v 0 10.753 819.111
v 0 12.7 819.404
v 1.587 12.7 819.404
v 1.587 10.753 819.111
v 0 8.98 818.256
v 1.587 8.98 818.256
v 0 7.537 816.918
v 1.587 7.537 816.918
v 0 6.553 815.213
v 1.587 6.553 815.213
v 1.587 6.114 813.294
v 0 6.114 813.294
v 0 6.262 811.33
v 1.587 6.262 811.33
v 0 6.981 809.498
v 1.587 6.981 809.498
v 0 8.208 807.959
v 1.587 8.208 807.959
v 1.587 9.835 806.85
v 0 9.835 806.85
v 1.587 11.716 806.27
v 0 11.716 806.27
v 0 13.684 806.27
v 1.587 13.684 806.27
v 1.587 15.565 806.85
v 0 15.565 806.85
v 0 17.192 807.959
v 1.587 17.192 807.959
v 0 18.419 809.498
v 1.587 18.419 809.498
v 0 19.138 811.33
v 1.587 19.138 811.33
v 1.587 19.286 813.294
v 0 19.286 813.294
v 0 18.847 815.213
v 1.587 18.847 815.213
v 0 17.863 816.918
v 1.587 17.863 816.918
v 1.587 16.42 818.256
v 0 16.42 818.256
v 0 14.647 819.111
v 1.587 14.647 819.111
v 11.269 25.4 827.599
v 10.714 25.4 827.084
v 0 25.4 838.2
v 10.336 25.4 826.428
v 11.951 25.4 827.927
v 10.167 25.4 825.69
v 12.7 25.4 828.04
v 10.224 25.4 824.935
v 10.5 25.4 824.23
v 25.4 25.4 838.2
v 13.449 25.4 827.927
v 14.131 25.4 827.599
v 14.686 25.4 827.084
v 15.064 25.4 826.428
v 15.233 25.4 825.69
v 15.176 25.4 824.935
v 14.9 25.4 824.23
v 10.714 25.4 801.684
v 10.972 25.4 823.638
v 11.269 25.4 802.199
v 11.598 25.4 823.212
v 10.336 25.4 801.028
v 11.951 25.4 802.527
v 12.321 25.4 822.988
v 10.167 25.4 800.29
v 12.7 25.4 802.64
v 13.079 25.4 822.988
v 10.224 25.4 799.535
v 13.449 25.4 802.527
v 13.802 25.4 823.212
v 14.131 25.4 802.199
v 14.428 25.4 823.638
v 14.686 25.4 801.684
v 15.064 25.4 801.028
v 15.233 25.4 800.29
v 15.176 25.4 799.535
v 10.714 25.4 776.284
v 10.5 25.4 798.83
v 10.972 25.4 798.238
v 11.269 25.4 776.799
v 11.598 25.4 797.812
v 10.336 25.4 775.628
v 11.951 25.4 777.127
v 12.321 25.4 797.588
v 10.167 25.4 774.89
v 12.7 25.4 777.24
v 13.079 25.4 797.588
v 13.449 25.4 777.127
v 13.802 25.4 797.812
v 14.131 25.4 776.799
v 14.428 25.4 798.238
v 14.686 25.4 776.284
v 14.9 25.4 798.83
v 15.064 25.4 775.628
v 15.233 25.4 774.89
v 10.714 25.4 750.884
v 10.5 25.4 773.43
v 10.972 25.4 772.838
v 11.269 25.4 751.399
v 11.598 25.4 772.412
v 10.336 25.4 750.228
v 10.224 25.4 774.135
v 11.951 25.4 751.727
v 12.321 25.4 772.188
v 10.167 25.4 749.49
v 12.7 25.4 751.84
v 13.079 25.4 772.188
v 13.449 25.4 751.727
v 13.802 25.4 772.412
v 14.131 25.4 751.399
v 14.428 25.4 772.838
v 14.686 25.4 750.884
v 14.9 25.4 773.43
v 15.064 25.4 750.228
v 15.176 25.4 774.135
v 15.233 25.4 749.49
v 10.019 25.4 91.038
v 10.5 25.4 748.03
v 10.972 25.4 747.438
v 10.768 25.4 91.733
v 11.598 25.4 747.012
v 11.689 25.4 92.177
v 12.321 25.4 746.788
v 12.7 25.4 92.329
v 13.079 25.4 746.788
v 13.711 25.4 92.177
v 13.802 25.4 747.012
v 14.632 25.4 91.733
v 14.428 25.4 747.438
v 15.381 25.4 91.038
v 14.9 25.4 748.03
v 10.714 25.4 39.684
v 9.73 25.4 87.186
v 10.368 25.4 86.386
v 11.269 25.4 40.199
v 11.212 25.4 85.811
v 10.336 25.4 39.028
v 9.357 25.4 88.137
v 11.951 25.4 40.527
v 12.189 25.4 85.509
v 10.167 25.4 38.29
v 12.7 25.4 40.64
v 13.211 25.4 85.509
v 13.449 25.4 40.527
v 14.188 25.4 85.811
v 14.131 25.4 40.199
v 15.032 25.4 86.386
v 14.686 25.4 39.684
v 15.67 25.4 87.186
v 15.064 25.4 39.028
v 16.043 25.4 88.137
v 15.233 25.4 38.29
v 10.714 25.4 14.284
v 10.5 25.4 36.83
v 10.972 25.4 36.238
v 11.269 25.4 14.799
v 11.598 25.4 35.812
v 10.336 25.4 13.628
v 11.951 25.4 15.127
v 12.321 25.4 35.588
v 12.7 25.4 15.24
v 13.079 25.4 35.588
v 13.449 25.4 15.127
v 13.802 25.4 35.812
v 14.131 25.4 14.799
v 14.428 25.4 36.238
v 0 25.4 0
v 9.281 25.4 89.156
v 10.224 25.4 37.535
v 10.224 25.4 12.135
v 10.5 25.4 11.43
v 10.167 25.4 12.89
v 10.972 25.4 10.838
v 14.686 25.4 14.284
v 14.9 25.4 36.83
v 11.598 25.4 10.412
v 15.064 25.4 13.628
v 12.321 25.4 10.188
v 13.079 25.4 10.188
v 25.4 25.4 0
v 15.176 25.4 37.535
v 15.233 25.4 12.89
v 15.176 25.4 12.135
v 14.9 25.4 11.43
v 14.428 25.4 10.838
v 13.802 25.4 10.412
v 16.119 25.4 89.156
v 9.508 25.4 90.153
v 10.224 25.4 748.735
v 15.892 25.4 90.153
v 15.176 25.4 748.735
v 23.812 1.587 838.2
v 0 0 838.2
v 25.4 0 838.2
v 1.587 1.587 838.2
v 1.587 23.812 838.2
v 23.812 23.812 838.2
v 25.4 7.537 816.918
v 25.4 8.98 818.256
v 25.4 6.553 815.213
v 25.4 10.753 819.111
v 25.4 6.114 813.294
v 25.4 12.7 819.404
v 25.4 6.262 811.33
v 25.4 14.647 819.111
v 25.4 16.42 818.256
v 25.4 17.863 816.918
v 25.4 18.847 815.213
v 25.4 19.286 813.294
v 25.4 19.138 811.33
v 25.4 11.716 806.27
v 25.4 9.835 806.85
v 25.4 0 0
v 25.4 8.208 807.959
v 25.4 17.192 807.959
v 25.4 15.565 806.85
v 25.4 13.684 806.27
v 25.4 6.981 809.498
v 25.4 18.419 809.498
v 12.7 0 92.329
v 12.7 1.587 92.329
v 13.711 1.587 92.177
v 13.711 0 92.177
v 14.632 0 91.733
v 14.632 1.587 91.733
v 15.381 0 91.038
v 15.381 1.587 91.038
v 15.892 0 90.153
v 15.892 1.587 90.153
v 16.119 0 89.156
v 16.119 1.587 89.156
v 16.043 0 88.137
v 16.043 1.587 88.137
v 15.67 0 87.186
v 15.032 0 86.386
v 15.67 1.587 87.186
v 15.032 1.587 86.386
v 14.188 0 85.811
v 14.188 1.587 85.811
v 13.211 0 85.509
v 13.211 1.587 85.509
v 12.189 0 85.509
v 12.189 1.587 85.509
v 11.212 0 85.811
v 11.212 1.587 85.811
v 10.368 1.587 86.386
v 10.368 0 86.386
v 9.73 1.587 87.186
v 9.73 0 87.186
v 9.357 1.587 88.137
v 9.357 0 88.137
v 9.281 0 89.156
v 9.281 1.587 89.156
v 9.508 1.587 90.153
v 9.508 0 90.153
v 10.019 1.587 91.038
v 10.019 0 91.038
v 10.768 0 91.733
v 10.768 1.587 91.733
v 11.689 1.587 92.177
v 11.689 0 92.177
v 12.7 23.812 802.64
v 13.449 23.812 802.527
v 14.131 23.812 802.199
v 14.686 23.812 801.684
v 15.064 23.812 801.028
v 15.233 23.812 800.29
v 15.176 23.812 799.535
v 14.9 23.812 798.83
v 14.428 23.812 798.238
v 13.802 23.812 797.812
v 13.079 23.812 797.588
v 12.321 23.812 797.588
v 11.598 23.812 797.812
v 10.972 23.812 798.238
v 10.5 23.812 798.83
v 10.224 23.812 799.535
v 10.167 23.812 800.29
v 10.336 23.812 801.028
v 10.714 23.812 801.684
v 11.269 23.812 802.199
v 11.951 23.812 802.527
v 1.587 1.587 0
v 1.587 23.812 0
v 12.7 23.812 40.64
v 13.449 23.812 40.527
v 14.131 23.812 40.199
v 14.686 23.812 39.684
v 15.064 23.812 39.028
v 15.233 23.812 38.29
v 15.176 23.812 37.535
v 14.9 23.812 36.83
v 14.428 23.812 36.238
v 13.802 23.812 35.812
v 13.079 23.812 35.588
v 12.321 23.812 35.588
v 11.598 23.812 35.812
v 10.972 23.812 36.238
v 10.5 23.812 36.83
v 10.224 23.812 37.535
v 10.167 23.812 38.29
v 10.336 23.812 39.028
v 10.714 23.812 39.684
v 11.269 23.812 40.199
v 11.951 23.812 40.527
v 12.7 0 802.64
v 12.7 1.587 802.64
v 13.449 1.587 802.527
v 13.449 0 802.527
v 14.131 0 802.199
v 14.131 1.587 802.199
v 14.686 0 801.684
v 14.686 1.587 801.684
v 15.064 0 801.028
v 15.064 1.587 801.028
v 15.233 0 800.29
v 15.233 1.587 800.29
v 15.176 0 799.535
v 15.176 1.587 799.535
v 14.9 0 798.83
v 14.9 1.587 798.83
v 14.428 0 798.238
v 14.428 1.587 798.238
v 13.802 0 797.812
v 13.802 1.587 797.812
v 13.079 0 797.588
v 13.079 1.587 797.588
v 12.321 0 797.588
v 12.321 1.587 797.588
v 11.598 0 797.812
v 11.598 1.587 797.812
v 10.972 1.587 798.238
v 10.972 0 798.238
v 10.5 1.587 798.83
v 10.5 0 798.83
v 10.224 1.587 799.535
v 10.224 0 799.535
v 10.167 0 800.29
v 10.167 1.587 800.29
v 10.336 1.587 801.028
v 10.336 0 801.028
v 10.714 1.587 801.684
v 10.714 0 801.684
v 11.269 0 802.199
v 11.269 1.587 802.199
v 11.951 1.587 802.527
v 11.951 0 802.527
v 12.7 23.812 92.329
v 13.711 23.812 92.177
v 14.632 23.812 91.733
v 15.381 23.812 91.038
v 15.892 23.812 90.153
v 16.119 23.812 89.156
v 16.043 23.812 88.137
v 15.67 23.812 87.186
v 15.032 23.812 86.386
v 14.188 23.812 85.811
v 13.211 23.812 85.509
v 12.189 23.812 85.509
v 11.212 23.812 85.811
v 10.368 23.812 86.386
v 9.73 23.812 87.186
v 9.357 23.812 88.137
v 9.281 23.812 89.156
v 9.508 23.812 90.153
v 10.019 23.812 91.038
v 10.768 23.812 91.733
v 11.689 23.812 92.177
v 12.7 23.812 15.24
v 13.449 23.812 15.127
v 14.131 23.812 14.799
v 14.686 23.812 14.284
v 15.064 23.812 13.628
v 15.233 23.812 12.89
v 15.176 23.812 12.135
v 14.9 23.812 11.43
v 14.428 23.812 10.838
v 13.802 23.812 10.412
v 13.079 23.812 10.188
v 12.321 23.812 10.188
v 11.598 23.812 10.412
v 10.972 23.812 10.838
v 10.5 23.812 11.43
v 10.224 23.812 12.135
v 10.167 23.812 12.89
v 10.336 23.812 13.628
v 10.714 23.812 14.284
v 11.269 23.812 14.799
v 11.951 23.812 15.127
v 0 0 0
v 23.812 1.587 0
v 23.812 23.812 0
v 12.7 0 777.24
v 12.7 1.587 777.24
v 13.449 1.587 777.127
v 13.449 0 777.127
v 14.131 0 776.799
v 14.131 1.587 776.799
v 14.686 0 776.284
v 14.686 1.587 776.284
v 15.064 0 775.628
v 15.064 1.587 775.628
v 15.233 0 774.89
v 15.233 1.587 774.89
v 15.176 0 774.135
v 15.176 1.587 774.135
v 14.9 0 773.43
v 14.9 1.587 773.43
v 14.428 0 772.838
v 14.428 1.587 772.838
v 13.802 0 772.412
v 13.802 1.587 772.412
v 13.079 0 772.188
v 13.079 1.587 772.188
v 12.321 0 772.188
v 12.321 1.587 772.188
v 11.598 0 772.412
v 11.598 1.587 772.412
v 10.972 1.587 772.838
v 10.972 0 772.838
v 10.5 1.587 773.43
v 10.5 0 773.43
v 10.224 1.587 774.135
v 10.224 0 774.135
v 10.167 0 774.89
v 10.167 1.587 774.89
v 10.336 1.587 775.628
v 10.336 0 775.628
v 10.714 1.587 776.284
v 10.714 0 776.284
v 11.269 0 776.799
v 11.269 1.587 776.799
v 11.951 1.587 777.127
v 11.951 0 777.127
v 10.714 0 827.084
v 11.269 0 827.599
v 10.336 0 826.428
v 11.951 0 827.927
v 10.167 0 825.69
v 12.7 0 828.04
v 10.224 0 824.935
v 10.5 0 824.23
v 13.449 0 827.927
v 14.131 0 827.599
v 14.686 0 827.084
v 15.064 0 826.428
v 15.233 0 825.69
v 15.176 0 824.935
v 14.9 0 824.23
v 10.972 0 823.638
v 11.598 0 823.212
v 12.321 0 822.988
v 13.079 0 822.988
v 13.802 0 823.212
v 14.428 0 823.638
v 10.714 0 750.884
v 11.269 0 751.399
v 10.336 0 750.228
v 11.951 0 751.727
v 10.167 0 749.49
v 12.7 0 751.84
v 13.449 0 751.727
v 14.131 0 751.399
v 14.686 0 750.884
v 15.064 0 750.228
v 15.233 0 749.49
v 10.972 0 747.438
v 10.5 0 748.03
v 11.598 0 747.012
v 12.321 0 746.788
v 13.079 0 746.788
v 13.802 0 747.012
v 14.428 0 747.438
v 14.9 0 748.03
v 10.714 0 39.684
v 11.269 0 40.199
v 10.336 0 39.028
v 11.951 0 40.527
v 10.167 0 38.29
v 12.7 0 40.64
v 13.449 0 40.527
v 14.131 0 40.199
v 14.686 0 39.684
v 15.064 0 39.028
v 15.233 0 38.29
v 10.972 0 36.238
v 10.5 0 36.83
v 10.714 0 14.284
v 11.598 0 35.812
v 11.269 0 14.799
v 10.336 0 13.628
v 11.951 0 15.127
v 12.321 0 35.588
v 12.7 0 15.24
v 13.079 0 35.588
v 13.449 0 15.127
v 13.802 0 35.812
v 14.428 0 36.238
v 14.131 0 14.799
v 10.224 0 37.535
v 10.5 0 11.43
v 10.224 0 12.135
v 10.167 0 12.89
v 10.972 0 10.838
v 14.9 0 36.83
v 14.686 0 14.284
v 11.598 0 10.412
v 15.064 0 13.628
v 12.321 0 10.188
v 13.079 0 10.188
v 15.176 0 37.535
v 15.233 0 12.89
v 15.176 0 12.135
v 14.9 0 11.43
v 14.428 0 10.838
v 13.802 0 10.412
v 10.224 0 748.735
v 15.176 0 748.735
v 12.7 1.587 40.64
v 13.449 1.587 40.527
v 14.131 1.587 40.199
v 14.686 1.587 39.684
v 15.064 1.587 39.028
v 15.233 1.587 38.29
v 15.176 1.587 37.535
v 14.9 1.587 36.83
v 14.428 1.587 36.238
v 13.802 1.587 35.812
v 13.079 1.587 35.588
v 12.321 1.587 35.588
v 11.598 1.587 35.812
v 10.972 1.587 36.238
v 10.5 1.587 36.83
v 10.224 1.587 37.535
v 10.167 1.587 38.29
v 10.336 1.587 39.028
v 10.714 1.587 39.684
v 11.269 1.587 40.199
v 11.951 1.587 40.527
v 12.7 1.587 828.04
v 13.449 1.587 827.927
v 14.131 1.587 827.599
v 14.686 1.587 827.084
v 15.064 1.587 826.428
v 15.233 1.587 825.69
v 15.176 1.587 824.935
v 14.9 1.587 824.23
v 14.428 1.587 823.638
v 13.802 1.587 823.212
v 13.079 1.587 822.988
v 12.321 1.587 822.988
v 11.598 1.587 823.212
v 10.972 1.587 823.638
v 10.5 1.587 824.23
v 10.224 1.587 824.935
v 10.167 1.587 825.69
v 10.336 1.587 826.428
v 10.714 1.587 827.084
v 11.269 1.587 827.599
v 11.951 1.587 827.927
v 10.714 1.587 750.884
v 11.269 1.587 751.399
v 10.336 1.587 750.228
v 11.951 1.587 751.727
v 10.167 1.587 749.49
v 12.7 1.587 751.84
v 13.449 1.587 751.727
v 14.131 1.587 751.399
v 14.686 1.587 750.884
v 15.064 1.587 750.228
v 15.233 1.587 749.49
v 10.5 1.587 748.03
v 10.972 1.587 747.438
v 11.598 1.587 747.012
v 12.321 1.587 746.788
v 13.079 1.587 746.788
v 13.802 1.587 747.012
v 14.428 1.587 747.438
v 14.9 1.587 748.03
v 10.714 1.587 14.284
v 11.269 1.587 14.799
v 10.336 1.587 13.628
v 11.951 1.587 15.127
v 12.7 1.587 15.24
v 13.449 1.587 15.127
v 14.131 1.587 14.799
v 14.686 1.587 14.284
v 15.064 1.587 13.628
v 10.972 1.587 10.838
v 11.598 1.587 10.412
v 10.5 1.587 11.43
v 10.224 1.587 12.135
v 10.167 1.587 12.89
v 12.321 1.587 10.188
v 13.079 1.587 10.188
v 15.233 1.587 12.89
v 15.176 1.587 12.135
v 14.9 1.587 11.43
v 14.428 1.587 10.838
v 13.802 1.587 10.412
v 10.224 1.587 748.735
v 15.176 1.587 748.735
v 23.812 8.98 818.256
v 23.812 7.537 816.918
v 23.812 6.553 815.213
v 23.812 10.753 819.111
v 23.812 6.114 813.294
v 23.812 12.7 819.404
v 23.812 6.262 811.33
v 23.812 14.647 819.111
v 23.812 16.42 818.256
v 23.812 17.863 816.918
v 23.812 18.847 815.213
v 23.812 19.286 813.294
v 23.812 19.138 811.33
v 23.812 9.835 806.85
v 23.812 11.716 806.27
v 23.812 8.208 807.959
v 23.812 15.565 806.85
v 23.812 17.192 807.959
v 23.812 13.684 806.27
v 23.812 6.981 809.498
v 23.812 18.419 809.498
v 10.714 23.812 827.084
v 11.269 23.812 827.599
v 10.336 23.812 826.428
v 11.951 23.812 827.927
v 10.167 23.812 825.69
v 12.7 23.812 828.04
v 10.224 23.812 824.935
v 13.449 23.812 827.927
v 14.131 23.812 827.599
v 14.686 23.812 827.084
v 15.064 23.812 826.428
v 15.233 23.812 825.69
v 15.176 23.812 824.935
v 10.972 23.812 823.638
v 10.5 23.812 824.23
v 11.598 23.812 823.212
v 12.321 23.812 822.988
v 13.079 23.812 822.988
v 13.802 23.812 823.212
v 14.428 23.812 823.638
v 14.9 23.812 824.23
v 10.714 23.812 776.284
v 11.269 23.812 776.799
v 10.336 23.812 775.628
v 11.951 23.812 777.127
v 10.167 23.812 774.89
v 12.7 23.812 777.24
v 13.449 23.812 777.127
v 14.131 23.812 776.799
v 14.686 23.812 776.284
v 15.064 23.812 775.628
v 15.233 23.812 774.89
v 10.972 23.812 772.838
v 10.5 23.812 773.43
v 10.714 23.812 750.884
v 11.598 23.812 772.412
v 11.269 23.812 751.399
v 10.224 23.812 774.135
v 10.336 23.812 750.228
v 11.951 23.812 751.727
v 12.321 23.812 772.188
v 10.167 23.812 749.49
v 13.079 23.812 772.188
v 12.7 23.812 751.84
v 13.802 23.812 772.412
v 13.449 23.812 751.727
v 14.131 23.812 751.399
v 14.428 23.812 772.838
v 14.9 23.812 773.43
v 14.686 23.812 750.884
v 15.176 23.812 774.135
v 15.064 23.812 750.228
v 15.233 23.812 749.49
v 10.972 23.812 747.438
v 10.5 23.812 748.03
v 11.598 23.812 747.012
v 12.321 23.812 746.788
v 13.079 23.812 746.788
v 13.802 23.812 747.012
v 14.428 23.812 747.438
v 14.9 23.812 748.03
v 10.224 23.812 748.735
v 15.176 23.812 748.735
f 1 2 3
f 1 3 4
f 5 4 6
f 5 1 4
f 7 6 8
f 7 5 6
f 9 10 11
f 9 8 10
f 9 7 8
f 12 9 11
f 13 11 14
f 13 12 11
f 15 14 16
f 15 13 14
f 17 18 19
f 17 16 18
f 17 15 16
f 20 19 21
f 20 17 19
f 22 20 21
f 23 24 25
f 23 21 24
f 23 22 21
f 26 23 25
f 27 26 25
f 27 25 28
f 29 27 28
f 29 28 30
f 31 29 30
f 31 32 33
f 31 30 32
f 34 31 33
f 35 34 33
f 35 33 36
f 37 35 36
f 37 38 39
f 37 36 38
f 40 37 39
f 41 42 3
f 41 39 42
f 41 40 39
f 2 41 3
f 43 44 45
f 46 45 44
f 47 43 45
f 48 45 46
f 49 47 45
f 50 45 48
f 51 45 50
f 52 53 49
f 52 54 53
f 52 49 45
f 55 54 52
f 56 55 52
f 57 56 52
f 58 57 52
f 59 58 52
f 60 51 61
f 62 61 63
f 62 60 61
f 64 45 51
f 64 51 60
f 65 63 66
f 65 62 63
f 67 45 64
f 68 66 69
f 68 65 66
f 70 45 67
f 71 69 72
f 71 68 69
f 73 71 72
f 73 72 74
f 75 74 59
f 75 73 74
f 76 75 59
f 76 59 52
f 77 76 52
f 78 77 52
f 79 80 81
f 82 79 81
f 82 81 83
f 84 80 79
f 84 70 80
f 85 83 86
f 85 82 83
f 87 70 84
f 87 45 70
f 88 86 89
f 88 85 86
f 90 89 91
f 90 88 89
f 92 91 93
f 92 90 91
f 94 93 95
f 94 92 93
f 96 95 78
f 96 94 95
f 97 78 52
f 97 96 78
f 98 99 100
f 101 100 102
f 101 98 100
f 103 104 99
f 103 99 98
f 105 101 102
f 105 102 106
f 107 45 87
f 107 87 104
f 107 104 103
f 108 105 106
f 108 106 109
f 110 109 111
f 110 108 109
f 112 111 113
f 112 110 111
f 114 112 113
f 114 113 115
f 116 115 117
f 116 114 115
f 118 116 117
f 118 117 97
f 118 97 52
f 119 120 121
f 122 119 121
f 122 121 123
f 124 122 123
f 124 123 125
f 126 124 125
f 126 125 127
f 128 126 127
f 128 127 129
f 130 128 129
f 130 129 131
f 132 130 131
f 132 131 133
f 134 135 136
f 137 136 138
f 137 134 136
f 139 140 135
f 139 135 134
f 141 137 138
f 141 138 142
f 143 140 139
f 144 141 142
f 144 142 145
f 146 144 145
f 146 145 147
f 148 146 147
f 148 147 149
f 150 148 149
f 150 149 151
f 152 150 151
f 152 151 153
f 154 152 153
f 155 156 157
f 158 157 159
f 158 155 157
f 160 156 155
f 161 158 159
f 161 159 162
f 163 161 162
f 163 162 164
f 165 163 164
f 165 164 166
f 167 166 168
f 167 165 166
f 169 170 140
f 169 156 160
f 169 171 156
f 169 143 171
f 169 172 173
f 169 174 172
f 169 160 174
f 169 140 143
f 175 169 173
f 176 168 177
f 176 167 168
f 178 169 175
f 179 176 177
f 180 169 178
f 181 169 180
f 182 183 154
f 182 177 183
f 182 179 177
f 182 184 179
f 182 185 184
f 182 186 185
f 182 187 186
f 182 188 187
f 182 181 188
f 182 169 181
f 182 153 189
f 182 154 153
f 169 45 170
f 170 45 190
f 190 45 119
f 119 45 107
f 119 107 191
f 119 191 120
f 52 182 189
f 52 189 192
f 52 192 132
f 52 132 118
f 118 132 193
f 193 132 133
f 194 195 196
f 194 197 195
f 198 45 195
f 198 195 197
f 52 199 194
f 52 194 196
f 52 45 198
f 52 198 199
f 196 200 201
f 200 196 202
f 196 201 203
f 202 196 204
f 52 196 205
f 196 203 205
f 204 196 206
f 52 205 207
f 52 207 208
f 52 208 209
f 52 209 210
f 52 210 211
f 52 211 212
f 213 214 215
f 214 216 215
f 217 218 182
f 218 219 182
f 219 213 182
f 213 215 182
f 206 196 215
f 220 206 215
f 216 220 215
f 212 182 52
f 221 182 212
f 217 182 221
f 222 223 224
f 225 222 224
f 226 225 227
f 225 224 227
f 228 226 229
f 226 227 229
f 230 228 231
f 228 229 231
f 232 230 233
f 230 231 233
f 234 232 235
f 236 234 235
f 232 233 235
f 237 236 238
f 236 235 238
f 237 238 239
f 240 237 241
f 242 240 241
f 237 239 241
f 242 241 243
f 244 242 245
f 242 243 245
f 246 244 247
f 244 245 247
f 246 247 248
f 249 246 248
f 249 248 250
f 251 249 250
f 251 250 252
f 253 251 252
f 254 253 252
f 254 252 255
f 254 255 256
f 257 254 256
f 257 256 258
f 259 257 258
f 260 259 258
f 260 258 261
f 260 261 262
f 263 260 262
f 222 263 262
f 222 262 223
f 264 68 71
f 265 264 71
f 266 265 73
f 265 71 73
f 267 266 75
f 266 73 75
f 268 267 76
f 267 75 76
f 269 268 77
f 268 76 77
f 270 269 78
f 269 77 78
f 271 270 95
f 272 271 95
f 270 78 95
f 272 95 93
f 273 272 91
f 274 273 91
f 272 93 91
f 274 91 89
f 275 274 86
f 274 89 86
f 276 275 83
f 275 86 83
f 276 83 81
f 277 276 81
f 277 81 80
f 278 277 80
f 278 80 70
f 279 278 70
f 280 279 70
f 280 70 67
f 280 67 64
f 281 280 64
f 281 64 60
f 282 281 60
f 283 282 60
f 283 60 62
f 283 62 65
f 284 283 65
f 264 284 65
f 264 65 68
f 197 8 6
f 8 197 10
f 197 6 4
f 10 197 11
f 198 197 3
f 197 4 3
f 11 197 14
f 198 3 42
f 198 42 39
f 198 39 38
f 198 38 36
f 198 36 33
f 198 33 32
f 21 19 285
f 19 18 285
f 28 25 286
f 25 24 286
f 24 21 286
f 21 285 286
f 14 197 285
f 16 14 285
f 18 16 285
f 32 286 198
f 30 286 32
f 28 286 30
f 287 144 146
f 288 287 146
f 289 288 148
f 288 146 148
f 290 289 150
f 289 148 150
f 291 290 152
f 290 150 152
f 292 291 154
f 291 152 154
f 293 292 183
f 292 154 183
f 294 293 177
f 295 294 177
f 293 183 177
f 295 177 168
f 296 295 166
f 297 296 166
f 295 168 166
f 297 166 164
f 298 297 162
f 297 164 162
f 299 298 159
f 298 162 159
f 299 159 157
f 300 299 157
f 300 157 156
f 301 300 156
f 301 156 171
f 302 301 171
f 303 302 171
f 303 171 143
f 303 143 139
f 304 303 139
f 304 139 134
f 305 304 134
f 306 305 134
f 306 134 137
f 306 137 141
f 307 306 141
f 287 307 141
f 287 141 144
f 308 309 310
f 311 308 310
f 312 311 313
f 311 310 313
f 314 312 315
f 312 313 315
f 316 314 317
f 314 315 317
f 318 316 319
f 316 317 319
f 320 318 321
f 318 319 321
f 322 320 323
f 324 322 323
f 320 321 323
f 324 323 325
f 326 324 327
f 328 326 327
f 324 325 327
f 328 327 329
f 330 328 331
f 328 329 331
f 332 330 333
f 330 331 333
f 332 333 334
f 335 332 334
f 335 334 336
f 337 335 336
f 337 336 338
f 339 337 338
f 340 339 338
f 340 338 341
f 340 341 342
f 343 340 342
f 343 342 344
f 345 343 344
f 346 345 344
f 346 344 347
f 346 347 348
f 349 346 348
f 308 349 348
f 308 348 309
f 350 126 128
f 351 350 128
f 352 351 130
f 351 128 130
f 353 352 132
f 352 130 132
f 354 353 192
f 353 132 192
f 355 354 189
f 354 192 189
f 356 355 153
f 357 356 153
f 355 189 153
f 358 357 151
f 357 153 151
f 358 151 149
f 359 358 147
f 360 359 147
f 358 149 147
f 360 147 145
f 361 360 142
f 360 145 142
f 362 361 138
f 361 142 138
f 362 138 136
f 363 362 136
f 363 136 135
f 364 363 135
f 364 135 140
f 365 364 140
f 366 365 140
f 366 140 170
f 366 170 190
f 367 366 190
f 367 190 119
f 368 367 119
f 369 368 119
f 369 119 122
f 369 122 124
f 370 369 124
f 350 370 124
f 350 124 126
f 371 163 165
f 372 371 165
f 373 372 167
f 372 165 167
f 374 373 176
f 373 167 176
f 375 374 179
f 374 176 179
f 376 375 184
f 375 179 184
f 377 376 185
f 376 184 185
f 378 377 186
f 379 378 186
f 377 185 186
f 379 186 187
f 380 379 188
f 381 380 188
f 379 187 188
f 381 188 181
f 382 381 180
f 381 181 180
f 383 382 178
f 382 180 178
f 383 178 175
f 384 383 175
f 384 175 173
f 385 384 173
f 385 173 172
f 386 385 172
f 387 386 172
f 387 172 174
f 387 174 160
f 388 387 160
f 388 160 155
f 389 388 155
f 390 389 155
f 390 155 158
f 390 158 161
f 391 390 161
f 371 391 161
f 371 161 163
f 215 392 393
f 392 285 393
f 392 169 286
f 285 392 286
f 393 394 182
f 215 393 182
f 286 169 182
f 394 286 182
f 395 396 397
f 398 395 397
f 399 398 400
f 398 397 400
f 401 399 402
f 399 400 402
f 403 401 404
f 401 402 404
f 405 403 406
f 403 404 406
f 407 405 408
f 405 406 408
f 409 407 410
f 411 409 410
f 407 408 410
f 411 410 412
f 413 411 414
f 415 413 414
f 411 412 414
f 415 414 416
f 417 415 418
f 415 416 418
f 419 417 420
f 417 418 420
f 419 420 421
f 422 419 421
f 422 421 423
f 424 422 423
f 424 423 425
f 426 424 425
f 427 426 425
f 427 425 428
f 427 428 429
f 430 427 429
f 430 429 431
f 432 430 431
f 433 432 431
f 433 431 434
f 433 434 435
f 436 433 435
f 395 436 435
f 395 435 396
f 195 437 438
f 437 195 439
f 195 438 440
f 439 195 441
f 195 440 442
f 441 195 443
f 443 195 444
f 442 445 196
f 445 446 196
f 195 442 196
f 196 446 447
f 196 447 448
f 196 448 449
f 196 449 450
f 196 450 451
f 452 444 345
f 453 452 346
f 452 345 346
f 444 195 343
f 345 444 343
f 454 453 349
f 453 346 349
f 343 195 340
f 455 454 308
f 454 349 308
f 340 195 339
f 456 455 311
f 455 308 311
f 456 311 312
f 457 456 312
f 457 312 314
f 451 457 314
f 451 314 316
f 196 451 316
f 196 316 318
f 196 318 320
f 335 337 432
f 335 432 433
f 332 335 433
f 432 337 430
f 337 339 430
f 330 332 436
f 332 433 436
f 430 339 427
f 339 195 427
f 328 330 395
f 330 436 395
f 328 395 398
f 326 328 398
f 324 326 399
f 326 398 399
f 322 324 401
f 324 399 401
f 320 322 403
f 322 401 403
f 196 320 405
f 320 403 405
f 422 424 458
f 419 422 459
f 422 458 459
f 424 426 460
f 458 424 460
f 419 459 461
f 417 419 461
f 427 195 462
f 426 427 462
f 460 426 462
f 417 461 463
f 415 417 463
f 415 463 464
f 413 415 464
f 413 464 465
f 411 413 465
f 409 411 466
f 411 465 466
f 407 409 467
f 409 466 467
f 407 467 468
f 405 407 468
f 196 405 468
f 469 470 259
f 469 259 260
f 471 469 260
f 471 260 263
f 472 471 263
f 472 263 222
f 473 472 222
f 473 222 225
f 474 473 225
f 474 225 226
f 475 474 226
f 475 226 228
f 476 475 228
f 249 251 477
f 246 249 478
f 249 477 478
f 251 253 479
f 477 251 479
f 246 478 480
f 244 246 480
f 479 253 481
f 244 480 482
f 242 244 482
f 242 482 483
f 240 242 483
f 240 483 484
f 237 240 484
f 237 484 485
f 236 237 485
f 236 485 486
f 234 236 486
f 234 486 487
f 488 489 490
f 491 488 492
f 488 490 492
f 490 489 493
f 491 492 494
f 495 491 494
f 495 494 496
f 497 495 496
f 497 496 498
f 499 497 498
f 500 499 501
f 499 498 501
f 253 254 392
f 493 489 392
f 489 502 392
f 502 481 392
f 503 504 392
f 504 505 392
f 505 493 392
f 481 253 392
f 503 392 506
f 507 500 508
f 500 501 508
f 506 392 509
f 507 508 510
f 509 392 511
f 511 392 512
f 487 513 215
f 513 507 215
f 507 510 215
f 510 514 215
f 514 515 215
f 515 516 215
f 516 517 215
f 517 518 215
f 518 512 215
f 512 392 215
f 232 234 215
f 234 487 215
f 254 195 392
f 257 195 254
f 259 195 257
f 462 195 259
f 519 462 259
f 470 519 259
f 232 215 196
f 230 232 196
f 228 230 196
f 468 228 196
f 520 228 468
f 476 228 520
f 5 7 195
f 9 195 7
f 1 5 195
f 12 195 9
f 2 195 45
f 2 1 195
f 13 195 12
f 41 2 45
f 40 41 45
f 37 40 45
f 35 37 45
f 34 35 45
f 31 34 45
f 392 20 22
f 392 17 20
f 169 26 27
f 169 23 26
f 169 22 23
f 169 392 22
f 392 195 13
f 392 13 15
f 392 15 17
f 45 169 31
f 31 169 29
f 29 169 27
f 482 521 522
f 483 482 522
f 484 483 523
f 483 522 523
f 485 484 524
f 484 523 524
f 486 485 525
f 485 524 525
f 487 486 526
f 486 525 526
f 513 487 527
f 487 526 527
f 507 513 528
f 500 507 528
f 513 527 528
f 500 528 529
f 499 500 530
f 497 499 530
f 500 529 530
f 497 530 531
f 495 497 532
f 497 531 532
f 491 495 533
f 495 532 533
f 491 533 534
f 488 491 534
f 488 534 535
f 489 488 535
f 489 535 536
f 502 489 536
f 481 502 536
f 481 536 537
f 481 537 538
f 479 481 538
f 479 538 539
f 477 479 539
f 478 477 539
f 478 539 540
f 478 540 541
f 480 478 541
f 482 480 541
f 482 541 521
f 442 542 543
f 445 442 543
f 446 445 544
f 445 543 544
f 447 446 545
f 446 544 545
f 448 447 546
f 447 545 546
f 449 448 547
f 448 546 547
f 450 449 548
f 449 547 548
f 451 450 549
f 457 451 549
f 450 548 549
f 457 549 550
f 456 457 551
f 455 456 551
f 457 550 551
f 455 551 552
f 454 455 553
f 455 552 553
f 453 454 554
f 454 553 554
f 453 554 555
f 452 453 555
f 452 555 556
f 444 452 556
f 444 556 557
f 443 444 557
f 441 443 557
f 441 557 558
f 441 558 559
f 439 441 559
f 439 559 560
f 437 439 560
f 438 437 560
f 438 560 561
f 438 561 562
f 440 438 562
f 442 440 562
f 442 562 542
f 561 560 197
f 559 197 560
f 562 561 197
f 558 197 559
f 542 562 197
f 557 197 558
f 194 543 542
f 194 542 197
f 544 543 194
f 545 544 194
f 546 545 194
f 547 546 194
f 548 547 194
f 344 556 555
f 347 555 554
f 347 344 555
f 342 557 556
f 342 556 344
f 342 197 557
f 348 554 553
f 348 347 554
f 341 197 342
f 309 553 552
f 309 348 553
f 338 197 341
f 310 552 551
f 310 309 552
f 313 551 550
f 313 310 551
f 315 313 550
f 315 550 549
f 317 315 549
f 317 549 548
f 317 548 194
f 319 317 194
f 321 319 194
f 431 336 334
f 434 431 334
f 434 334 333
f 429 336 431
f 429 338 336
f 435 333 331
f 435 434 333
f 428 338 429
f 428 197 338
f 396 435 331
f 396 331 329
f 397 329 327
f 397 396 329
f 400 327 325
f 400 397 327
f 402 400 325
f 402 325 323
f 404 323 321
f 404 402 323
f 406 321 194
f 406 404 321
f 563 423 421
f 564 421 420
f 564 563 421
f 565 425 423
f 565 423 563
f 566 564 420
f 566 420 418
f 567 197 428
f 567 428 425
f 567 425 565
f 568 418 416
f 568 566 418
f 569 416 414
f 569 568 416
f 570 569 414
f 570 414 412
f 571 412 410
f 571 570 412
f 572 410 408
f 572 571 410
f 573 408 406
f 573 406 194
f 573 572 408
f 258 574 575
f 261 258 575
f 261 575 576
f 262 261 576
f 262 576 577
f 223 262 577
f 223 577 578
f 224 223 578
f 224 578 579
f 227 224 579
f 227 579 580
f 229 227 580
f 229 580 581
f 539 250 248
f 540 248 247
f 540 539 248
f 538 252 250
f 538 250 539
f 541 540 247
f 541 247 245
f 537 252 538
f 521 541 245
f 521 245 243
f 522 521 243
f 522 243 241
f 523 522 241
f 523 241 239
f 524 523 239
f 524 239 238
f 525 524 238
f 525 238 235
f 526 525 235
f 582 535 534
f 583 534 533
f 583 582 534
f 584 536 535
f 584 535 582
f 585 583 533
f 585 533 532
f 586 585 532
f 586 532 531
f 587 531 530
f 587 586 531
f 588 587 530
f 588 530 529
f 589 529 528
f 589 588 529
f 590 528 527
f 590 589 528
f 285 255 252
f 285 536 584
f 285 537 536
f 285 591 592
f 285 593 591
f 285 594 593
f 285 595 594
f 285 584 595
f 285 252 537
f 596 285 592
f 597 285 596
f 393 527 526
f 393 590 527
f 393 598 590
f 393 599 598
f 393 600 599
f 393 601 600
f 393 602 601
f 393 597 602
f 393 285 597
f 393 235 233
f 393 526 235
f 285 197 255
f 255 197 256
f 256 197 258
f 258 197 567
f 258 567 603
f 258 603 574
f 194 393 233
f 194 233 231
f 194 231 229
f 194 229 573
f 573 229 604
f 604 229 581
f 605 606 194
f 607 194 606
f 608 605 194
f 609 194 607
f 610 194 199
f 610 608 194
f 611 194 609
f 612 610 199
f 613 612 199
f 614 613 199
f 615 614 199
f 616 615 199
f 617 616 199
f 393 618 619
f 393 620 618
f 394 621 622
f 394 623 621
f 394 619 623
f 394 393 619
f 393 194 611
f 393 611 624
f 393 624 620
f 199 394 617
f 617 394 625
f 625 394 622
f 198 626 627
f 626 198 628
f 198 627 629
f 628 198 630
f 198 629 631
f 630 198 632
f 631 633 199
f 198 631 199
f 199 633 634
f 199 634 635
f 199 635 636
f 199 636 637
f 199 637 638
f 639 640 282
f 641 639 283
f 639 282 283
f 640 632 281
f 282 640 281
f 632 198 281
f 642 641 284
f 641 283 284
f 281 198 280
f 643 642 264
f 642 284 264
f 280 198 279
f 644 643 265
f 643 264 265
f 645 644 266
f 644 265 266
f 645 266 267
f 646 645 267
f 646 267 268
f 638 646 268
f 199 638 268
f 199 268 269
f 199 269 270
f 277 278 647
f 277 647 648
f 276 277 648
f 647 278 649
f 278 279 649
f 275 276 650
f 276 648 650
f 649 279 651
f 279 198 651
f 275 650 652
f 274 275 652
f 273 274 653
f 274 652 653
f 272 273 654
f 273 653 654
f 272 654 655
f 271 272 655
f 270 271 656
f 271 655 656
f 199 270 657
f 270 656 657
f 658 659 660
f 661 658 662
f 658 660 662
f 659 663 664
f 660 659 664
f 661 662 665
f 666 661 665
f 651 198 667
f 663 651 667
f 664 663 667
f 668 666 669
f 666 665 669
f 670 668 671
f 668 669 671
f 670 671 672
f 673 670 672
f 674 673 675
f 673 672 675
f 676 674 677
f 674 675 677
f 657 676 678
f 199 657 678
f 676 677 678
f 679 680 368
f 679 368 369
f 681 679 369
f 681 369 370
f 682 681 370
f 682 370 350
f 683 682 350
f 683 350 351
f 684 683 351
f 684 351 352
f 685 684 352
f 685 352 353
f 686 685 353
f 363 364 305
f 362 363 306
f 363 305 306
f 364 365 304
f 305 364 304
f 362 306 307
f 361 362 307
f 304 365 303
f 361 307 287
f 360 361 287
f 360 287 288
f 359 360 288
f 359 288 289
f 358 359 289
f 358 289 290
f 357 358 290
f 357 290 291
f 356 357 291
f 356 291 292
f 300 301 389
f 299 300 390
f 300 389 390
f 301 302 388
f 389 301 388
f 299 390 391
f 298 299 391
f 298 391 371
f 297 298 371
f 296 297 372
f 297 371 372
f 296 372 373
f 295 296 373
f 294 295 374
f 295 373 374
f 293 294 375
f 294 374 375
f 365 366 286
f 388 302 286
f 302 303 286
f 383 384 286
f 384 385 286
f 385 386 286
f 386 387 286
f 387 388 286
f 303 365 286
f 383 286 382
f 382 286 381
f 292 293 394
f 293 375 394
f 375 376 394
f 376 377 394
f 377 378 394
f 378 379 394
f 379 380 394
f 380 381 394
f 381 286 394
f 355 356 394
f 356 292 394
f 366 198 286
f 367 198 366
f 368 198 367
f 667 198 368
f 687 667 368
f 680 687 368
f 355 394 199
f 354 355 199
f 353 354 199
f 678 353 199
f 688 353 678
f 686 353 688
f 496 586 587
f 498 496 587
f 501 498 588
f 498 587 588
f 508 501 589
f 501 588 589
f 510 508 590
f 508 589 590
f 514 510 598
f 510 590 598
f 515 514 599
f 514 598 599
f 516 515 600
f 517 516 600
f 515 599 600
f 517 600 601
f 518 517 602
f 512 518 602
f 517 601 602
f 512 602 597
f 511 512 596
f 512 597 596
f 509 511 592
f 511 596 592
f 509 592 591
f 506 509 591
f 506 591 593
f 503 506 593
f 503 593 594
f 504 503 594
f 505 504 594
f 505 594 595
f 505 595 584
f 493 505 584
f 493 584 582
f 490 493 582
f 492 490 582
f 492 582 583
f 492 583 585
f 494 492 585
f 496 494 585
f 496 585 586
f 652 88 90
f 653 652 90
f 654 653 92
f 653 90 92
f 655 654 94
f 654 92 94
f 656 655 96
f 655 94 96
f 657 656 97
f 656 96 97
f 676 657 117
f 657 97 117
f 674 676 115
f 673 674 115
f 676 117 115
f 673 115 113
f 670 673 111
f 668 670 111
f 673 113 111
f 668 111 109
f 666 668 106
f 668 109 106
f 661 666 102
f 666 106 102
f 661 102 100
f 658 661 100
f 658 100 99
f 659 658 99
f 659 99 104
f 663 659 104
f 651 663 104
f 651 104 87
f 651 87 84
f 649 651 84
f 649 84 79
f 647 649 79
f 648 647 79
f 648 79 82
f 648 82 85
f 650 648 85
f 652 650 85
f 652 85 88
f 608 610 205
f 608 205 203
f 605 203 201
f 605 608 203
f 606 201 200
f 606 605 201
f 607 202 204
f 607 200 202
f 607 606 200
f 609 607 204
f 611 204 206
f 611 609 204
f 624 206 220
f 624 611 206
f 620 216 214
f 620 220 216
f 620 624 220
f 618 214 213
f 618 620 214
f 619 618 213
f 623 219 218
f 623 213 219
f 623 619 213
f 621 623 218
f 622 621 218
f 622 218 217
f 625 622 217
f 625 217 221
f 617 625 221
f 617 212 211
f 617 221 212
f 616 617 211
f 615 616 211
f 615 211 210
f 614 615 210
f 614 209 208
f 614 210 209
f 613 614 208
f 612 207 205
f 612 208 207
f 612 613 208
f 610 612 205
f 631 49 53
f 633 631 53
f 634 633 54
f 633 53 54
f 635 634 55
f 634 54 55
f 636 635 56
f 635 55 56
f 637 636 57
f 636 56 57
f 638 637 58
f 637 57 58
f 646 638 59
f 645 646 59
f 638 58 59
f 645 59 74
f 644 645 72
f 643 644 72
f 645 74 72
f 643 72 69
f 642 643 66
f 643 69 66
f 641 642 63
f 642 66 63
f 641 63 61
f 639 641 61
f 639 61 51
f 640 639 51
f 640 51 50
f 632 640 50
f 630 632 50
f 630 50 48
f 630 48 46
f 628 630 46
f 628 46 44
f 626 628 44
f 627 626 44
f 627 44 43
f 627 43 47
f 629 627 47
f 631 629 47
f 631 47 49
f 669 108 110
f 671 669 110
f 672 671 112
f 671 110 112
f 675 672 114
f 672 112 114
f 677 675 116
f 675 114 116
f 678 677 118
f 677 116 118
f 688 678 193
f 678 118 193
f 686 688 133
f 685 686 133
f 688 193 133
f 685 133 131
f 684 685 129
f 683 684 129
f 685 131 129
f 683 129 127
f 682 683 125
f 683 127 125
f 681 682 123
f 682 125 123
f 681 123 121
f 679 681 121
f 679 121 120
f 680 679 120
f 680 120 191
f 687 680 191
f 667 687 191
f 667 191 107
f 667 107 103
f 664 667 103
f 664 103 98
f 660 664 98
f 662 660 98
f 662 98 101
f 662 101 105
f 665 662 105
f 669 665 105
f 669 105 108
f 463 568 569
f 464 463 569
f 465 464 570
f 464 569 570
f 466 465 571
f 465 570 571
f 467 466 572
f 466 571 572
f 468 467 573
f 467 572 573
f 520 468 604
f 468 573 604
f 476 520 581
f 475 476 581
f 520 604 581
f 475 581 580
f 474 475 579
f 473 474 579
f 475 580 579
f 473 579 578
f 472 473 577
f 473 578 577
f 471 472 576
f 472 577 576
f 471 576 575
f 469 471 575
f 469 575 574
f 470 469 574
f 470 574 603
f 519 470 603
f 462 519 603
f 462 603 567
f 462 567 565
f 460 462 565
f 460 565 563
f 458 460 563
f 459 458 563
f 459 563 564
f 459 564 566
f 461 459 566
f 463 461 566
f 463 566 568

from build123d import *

# Parameters (mm, degrees)
SKETCH1_W               = 25.4
SKETCH1_H               = 25.4
SKETCH1_W_2             = 22.225
SKETCH1_H_2             = 22.225
BOSS_EXTRUDE1_DEPTH     = 838.2
SKETCH3_R               = 2.54
SKETCH3_R_2             = 3.429
CUT_EXTRUDE2_DEPTH      = 839.969343898
CUT_EXTRUDE3_DEPTH      = 839.969343898
CUT_EXTRUDE3_DEPTH_BACK = 839.969343898
SKETCH4_R               = 6.604


with BuildPart() as part:
    # Sketch1 → Boss-Extrude1 (new body)
    with BuildSketch(Plane.XY):
        with Locations((12.7, 12.7)):
            Rectangle(SKETCH1_W, SKETCH1_H)
        with Locations((12.7, 12.7)):
            Rectangle(SKETCH1_W_2, SKETCH1_H_2, mode=Mode.SUBTRACT)
    extrude(amount=BOSS_EXTRUDE1_DEPTH)

    # Sketch3 → Cut-Extrude2 (cut, through all)
    with BuildSketch(Plane(origin=(0, 25.4, 0), x_dir=(1, 0, 0), z_dir=(0, 1, 0))):
        with Locations(Location((12.7, -12.7, 0), (0, 0, 270))):
            Circle(SKETCH3_R)
        with Locations(Location((12.7, -825.5, 0), (0, 0, 270))):
            Circle(SKETCH3_R)
        with Locations(Location((12.7, -38.1, 0), (0, 0, 270))):
            Circle(SKETCH3_R)
        with Locations(Location((12.7, -88.9, 0), (0, 0, 270))):
            Circle(SKETCH3_R_2)
        with Locations(Location((12.7, -800.1, 0), (0, 0, 270))):
            Circle(SKETCH3_R)
        with Locations(Location((12.7, -774.7, 0), (0, 0, 270))):
            Circle(SKETCH3_R)
        with Locations(Location((12.7, -749.3, 0), (0, 0, 270))):
            Circle(SKETCH3_R)
    extrude(amount=-CUT_EXTRUDE2_DEPTH, mode=Mode.SUBTRACT)

    # Sketch4 → Cut-Extrude3 (cut, two sides: drawn at the far end of the back side and taken through both)
    with BuildSketch(Plane(origin=(25.4, 0, 0), x_dir=(0, 0, -1), z_dir=(1, 0, 0)).offset(-CUT_EXTRUDE3_DEPTH_BACK)):
        with Locations(Location((-812.8, 12.7, 0), (0, 0, 180))):
            Circle(SKETCH4_R)
    extrude(amount=CUT_EXTRUDE3_DEPTH + CUT_EXTRUDE3_DEPTH_BACK, mode=Mode.SUBTRACT)


solid = part.part
